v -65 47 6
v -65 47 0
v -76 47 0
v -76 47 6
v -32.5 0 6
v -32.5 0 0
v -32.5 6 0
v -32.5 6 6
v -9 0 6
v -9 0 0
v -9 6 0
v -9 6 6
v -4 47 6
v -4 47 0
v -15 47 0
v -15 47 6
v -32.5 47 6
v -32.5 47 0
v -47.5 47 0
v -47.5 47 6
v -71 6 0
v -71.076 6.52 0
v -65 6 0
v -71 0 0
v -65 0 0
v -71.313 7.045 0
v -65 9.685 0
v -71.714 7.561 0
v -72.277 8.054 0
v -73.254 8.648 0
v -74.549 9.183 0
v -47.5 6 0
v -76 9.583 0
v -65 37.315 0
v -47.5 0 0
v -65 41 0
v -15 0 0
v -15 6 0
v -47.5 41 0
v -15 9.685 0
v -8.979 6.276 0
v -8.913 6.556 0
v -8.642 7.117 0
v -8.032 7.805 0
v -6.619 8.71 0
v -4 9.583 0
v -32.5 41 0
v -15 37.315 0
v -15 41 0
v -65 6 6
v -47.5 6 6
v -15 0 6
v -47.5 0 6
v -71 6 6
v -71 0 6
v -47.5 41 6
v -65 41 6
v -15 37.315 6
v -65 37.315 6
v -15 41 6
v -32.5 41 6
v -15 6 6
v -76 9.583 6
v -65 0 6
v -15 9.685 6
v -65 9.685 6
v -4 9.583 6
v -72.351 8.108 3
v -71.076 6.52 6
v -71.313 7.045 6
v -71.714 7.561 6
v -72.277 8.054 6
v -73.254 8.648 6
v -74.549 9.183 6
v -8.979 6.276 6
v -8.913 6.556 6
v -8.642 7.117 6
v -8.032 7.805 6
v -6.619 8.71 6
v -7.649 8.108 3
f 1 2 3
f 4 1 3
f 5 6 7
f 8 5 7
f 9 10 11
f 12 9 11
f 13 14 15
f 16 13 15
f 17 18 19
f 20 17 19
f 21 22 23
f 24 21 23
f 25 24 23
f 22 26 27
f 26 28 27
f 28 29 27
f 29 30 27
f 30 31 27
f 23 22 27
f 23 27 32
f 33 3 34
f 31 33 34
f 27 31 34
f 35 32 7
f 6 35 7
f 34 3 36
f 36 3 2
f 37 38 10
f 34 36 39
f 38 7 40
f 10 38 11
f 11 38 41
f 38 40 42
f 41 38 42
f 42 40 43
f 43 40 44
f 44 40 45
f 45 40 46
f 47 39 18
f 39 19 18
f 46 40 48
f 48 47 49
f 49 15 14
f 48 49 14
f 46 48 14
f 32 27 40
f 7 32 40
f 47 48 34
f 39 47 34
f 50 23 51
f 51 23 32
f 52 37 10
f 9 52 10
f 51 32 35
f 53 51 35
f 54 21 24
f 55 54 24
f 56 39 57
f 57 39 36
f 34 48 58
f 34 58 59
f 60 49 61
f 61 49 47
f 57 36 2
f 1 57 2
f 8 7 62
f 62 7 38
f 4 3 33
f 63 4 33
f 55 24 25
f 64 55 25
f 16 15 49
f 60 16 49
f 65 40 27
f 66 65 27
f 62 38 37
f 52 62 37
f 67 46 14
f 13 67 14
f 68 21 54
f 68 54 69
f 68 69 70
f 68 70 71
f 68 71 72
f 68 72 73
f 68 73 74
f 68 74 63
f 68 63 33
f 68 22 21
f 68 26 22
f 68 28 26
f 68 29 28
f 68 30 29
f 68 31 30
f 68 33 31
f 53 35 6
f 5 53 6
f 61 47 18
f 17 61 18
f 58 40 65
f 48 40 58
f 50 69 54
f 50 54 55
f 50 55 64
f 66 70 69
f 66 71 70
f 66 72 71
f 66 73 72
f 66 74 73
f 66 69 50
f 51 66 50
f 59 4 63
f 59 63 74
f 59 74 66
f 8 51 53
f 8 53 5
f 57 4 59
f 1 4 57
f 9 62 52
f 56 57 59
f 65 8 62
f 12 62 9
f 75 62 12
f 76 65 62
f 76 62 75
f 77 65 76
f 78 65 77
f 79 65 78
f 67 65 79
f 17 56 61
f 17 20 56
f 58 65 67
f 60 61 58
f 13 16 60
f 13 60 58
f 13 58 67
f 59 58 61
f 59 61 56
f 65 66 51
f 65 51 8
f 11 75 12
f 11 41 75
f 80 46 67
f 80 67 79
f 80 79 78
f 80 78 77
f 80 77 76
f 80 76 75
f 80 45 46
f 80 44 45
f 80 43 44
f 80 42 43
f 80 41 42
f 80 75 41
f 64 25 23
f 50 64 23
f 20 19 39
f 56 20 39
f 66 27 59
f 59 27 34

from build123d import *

# Parameters (mm, degrees)
BOSS_EXTRUDE1_DEPTH = 6
SKETCH4_W           = 50
SKETCH4_H           = 27.629262186
CUT_EXTRUDE1_DEPTH  = 90.560035874


with BuildPart() as part:
    # Sketch2 → Boss-Extrude1 (new body)
    with BuildSketch(Plane.XY):
        with BuildLine():
            Line((-15, 0), (-9, 0))
            Line((-9, 0), (-9, 6))
            add(Edge.make_bspline(
                [(-4, 9.583225666), (-9, 8.480694692), (-9, 6)],
                knots=[5.172942972, 5.172942972, 5.172942972, 6.283185307, 6.283185307, 6.283185307], degree=2, weights=[1, 0.849836586, 1]))
            Line((-4, 9.583225666), (-4, 41))
            Line((-4, 41), (-4, 47))
            Line((-4, 47), (-15, 47))
            Line((-15, 47), (-15, 41))
            Line((-15, 41), (-32.5, 41))
            Line((-32.5, 41), (-32.5, 47))
            Line((-32.5, 47), (-47.5, 47))
            Line((-47.5, 47), (-47.5, 41))
            Line((-47.5, 41), (-65, 41))
            Line((-65, 41), (-65, 47))
            Line((-65, 47), (-76, 47))
            Line((-76, 47), (-76, 41))
            Line((-76, 41), (-76, 9.583225666))
            add(Edge.make_bspline(
                [(-71, 6), (-71, 8.480694692), (-76, 9.583225666)],
                knots=[0, 0, 0, 1.110242335, 1.110242335, 1.110242335], degree=2, weights=[1, 0.849836586, 1]))
            Line((-71, 6), (-71, 0))
            Line((-71, 0), (-65, 0))
            Line((-65, 0), (-65, 6))
            Line((-65, 6), (-47.5, 6))
            Line((-47.5, 6), (-47.5, 0))
            Line((-47.5, 0), (-32.5, 0))
            Line((-32.5, 0), (-32.5, 6))
            Line((-32.5, 6), (-15, 6))
            Line((-15, 6), (-15, 0))
        make_face()
    extrude(amount=BOSS_EXTRUDE1_DEPTH)

    # Sketch4 → Cut-Extrude1 (cut, through all)
    with BuildSketch(Plane(origin=(0, 0, 0), x_dir=(-1, 0, 0), z_dir=(0, 0, -1))):
        with Locations((40, 23.5)):
            Rectangle(SKETCH4_W, SKETCH4_H)
    extrude(amount=-CUT_EXTRUDE1_DEPTH, mode=Mode.SUBTRACT)


solid = part.part
